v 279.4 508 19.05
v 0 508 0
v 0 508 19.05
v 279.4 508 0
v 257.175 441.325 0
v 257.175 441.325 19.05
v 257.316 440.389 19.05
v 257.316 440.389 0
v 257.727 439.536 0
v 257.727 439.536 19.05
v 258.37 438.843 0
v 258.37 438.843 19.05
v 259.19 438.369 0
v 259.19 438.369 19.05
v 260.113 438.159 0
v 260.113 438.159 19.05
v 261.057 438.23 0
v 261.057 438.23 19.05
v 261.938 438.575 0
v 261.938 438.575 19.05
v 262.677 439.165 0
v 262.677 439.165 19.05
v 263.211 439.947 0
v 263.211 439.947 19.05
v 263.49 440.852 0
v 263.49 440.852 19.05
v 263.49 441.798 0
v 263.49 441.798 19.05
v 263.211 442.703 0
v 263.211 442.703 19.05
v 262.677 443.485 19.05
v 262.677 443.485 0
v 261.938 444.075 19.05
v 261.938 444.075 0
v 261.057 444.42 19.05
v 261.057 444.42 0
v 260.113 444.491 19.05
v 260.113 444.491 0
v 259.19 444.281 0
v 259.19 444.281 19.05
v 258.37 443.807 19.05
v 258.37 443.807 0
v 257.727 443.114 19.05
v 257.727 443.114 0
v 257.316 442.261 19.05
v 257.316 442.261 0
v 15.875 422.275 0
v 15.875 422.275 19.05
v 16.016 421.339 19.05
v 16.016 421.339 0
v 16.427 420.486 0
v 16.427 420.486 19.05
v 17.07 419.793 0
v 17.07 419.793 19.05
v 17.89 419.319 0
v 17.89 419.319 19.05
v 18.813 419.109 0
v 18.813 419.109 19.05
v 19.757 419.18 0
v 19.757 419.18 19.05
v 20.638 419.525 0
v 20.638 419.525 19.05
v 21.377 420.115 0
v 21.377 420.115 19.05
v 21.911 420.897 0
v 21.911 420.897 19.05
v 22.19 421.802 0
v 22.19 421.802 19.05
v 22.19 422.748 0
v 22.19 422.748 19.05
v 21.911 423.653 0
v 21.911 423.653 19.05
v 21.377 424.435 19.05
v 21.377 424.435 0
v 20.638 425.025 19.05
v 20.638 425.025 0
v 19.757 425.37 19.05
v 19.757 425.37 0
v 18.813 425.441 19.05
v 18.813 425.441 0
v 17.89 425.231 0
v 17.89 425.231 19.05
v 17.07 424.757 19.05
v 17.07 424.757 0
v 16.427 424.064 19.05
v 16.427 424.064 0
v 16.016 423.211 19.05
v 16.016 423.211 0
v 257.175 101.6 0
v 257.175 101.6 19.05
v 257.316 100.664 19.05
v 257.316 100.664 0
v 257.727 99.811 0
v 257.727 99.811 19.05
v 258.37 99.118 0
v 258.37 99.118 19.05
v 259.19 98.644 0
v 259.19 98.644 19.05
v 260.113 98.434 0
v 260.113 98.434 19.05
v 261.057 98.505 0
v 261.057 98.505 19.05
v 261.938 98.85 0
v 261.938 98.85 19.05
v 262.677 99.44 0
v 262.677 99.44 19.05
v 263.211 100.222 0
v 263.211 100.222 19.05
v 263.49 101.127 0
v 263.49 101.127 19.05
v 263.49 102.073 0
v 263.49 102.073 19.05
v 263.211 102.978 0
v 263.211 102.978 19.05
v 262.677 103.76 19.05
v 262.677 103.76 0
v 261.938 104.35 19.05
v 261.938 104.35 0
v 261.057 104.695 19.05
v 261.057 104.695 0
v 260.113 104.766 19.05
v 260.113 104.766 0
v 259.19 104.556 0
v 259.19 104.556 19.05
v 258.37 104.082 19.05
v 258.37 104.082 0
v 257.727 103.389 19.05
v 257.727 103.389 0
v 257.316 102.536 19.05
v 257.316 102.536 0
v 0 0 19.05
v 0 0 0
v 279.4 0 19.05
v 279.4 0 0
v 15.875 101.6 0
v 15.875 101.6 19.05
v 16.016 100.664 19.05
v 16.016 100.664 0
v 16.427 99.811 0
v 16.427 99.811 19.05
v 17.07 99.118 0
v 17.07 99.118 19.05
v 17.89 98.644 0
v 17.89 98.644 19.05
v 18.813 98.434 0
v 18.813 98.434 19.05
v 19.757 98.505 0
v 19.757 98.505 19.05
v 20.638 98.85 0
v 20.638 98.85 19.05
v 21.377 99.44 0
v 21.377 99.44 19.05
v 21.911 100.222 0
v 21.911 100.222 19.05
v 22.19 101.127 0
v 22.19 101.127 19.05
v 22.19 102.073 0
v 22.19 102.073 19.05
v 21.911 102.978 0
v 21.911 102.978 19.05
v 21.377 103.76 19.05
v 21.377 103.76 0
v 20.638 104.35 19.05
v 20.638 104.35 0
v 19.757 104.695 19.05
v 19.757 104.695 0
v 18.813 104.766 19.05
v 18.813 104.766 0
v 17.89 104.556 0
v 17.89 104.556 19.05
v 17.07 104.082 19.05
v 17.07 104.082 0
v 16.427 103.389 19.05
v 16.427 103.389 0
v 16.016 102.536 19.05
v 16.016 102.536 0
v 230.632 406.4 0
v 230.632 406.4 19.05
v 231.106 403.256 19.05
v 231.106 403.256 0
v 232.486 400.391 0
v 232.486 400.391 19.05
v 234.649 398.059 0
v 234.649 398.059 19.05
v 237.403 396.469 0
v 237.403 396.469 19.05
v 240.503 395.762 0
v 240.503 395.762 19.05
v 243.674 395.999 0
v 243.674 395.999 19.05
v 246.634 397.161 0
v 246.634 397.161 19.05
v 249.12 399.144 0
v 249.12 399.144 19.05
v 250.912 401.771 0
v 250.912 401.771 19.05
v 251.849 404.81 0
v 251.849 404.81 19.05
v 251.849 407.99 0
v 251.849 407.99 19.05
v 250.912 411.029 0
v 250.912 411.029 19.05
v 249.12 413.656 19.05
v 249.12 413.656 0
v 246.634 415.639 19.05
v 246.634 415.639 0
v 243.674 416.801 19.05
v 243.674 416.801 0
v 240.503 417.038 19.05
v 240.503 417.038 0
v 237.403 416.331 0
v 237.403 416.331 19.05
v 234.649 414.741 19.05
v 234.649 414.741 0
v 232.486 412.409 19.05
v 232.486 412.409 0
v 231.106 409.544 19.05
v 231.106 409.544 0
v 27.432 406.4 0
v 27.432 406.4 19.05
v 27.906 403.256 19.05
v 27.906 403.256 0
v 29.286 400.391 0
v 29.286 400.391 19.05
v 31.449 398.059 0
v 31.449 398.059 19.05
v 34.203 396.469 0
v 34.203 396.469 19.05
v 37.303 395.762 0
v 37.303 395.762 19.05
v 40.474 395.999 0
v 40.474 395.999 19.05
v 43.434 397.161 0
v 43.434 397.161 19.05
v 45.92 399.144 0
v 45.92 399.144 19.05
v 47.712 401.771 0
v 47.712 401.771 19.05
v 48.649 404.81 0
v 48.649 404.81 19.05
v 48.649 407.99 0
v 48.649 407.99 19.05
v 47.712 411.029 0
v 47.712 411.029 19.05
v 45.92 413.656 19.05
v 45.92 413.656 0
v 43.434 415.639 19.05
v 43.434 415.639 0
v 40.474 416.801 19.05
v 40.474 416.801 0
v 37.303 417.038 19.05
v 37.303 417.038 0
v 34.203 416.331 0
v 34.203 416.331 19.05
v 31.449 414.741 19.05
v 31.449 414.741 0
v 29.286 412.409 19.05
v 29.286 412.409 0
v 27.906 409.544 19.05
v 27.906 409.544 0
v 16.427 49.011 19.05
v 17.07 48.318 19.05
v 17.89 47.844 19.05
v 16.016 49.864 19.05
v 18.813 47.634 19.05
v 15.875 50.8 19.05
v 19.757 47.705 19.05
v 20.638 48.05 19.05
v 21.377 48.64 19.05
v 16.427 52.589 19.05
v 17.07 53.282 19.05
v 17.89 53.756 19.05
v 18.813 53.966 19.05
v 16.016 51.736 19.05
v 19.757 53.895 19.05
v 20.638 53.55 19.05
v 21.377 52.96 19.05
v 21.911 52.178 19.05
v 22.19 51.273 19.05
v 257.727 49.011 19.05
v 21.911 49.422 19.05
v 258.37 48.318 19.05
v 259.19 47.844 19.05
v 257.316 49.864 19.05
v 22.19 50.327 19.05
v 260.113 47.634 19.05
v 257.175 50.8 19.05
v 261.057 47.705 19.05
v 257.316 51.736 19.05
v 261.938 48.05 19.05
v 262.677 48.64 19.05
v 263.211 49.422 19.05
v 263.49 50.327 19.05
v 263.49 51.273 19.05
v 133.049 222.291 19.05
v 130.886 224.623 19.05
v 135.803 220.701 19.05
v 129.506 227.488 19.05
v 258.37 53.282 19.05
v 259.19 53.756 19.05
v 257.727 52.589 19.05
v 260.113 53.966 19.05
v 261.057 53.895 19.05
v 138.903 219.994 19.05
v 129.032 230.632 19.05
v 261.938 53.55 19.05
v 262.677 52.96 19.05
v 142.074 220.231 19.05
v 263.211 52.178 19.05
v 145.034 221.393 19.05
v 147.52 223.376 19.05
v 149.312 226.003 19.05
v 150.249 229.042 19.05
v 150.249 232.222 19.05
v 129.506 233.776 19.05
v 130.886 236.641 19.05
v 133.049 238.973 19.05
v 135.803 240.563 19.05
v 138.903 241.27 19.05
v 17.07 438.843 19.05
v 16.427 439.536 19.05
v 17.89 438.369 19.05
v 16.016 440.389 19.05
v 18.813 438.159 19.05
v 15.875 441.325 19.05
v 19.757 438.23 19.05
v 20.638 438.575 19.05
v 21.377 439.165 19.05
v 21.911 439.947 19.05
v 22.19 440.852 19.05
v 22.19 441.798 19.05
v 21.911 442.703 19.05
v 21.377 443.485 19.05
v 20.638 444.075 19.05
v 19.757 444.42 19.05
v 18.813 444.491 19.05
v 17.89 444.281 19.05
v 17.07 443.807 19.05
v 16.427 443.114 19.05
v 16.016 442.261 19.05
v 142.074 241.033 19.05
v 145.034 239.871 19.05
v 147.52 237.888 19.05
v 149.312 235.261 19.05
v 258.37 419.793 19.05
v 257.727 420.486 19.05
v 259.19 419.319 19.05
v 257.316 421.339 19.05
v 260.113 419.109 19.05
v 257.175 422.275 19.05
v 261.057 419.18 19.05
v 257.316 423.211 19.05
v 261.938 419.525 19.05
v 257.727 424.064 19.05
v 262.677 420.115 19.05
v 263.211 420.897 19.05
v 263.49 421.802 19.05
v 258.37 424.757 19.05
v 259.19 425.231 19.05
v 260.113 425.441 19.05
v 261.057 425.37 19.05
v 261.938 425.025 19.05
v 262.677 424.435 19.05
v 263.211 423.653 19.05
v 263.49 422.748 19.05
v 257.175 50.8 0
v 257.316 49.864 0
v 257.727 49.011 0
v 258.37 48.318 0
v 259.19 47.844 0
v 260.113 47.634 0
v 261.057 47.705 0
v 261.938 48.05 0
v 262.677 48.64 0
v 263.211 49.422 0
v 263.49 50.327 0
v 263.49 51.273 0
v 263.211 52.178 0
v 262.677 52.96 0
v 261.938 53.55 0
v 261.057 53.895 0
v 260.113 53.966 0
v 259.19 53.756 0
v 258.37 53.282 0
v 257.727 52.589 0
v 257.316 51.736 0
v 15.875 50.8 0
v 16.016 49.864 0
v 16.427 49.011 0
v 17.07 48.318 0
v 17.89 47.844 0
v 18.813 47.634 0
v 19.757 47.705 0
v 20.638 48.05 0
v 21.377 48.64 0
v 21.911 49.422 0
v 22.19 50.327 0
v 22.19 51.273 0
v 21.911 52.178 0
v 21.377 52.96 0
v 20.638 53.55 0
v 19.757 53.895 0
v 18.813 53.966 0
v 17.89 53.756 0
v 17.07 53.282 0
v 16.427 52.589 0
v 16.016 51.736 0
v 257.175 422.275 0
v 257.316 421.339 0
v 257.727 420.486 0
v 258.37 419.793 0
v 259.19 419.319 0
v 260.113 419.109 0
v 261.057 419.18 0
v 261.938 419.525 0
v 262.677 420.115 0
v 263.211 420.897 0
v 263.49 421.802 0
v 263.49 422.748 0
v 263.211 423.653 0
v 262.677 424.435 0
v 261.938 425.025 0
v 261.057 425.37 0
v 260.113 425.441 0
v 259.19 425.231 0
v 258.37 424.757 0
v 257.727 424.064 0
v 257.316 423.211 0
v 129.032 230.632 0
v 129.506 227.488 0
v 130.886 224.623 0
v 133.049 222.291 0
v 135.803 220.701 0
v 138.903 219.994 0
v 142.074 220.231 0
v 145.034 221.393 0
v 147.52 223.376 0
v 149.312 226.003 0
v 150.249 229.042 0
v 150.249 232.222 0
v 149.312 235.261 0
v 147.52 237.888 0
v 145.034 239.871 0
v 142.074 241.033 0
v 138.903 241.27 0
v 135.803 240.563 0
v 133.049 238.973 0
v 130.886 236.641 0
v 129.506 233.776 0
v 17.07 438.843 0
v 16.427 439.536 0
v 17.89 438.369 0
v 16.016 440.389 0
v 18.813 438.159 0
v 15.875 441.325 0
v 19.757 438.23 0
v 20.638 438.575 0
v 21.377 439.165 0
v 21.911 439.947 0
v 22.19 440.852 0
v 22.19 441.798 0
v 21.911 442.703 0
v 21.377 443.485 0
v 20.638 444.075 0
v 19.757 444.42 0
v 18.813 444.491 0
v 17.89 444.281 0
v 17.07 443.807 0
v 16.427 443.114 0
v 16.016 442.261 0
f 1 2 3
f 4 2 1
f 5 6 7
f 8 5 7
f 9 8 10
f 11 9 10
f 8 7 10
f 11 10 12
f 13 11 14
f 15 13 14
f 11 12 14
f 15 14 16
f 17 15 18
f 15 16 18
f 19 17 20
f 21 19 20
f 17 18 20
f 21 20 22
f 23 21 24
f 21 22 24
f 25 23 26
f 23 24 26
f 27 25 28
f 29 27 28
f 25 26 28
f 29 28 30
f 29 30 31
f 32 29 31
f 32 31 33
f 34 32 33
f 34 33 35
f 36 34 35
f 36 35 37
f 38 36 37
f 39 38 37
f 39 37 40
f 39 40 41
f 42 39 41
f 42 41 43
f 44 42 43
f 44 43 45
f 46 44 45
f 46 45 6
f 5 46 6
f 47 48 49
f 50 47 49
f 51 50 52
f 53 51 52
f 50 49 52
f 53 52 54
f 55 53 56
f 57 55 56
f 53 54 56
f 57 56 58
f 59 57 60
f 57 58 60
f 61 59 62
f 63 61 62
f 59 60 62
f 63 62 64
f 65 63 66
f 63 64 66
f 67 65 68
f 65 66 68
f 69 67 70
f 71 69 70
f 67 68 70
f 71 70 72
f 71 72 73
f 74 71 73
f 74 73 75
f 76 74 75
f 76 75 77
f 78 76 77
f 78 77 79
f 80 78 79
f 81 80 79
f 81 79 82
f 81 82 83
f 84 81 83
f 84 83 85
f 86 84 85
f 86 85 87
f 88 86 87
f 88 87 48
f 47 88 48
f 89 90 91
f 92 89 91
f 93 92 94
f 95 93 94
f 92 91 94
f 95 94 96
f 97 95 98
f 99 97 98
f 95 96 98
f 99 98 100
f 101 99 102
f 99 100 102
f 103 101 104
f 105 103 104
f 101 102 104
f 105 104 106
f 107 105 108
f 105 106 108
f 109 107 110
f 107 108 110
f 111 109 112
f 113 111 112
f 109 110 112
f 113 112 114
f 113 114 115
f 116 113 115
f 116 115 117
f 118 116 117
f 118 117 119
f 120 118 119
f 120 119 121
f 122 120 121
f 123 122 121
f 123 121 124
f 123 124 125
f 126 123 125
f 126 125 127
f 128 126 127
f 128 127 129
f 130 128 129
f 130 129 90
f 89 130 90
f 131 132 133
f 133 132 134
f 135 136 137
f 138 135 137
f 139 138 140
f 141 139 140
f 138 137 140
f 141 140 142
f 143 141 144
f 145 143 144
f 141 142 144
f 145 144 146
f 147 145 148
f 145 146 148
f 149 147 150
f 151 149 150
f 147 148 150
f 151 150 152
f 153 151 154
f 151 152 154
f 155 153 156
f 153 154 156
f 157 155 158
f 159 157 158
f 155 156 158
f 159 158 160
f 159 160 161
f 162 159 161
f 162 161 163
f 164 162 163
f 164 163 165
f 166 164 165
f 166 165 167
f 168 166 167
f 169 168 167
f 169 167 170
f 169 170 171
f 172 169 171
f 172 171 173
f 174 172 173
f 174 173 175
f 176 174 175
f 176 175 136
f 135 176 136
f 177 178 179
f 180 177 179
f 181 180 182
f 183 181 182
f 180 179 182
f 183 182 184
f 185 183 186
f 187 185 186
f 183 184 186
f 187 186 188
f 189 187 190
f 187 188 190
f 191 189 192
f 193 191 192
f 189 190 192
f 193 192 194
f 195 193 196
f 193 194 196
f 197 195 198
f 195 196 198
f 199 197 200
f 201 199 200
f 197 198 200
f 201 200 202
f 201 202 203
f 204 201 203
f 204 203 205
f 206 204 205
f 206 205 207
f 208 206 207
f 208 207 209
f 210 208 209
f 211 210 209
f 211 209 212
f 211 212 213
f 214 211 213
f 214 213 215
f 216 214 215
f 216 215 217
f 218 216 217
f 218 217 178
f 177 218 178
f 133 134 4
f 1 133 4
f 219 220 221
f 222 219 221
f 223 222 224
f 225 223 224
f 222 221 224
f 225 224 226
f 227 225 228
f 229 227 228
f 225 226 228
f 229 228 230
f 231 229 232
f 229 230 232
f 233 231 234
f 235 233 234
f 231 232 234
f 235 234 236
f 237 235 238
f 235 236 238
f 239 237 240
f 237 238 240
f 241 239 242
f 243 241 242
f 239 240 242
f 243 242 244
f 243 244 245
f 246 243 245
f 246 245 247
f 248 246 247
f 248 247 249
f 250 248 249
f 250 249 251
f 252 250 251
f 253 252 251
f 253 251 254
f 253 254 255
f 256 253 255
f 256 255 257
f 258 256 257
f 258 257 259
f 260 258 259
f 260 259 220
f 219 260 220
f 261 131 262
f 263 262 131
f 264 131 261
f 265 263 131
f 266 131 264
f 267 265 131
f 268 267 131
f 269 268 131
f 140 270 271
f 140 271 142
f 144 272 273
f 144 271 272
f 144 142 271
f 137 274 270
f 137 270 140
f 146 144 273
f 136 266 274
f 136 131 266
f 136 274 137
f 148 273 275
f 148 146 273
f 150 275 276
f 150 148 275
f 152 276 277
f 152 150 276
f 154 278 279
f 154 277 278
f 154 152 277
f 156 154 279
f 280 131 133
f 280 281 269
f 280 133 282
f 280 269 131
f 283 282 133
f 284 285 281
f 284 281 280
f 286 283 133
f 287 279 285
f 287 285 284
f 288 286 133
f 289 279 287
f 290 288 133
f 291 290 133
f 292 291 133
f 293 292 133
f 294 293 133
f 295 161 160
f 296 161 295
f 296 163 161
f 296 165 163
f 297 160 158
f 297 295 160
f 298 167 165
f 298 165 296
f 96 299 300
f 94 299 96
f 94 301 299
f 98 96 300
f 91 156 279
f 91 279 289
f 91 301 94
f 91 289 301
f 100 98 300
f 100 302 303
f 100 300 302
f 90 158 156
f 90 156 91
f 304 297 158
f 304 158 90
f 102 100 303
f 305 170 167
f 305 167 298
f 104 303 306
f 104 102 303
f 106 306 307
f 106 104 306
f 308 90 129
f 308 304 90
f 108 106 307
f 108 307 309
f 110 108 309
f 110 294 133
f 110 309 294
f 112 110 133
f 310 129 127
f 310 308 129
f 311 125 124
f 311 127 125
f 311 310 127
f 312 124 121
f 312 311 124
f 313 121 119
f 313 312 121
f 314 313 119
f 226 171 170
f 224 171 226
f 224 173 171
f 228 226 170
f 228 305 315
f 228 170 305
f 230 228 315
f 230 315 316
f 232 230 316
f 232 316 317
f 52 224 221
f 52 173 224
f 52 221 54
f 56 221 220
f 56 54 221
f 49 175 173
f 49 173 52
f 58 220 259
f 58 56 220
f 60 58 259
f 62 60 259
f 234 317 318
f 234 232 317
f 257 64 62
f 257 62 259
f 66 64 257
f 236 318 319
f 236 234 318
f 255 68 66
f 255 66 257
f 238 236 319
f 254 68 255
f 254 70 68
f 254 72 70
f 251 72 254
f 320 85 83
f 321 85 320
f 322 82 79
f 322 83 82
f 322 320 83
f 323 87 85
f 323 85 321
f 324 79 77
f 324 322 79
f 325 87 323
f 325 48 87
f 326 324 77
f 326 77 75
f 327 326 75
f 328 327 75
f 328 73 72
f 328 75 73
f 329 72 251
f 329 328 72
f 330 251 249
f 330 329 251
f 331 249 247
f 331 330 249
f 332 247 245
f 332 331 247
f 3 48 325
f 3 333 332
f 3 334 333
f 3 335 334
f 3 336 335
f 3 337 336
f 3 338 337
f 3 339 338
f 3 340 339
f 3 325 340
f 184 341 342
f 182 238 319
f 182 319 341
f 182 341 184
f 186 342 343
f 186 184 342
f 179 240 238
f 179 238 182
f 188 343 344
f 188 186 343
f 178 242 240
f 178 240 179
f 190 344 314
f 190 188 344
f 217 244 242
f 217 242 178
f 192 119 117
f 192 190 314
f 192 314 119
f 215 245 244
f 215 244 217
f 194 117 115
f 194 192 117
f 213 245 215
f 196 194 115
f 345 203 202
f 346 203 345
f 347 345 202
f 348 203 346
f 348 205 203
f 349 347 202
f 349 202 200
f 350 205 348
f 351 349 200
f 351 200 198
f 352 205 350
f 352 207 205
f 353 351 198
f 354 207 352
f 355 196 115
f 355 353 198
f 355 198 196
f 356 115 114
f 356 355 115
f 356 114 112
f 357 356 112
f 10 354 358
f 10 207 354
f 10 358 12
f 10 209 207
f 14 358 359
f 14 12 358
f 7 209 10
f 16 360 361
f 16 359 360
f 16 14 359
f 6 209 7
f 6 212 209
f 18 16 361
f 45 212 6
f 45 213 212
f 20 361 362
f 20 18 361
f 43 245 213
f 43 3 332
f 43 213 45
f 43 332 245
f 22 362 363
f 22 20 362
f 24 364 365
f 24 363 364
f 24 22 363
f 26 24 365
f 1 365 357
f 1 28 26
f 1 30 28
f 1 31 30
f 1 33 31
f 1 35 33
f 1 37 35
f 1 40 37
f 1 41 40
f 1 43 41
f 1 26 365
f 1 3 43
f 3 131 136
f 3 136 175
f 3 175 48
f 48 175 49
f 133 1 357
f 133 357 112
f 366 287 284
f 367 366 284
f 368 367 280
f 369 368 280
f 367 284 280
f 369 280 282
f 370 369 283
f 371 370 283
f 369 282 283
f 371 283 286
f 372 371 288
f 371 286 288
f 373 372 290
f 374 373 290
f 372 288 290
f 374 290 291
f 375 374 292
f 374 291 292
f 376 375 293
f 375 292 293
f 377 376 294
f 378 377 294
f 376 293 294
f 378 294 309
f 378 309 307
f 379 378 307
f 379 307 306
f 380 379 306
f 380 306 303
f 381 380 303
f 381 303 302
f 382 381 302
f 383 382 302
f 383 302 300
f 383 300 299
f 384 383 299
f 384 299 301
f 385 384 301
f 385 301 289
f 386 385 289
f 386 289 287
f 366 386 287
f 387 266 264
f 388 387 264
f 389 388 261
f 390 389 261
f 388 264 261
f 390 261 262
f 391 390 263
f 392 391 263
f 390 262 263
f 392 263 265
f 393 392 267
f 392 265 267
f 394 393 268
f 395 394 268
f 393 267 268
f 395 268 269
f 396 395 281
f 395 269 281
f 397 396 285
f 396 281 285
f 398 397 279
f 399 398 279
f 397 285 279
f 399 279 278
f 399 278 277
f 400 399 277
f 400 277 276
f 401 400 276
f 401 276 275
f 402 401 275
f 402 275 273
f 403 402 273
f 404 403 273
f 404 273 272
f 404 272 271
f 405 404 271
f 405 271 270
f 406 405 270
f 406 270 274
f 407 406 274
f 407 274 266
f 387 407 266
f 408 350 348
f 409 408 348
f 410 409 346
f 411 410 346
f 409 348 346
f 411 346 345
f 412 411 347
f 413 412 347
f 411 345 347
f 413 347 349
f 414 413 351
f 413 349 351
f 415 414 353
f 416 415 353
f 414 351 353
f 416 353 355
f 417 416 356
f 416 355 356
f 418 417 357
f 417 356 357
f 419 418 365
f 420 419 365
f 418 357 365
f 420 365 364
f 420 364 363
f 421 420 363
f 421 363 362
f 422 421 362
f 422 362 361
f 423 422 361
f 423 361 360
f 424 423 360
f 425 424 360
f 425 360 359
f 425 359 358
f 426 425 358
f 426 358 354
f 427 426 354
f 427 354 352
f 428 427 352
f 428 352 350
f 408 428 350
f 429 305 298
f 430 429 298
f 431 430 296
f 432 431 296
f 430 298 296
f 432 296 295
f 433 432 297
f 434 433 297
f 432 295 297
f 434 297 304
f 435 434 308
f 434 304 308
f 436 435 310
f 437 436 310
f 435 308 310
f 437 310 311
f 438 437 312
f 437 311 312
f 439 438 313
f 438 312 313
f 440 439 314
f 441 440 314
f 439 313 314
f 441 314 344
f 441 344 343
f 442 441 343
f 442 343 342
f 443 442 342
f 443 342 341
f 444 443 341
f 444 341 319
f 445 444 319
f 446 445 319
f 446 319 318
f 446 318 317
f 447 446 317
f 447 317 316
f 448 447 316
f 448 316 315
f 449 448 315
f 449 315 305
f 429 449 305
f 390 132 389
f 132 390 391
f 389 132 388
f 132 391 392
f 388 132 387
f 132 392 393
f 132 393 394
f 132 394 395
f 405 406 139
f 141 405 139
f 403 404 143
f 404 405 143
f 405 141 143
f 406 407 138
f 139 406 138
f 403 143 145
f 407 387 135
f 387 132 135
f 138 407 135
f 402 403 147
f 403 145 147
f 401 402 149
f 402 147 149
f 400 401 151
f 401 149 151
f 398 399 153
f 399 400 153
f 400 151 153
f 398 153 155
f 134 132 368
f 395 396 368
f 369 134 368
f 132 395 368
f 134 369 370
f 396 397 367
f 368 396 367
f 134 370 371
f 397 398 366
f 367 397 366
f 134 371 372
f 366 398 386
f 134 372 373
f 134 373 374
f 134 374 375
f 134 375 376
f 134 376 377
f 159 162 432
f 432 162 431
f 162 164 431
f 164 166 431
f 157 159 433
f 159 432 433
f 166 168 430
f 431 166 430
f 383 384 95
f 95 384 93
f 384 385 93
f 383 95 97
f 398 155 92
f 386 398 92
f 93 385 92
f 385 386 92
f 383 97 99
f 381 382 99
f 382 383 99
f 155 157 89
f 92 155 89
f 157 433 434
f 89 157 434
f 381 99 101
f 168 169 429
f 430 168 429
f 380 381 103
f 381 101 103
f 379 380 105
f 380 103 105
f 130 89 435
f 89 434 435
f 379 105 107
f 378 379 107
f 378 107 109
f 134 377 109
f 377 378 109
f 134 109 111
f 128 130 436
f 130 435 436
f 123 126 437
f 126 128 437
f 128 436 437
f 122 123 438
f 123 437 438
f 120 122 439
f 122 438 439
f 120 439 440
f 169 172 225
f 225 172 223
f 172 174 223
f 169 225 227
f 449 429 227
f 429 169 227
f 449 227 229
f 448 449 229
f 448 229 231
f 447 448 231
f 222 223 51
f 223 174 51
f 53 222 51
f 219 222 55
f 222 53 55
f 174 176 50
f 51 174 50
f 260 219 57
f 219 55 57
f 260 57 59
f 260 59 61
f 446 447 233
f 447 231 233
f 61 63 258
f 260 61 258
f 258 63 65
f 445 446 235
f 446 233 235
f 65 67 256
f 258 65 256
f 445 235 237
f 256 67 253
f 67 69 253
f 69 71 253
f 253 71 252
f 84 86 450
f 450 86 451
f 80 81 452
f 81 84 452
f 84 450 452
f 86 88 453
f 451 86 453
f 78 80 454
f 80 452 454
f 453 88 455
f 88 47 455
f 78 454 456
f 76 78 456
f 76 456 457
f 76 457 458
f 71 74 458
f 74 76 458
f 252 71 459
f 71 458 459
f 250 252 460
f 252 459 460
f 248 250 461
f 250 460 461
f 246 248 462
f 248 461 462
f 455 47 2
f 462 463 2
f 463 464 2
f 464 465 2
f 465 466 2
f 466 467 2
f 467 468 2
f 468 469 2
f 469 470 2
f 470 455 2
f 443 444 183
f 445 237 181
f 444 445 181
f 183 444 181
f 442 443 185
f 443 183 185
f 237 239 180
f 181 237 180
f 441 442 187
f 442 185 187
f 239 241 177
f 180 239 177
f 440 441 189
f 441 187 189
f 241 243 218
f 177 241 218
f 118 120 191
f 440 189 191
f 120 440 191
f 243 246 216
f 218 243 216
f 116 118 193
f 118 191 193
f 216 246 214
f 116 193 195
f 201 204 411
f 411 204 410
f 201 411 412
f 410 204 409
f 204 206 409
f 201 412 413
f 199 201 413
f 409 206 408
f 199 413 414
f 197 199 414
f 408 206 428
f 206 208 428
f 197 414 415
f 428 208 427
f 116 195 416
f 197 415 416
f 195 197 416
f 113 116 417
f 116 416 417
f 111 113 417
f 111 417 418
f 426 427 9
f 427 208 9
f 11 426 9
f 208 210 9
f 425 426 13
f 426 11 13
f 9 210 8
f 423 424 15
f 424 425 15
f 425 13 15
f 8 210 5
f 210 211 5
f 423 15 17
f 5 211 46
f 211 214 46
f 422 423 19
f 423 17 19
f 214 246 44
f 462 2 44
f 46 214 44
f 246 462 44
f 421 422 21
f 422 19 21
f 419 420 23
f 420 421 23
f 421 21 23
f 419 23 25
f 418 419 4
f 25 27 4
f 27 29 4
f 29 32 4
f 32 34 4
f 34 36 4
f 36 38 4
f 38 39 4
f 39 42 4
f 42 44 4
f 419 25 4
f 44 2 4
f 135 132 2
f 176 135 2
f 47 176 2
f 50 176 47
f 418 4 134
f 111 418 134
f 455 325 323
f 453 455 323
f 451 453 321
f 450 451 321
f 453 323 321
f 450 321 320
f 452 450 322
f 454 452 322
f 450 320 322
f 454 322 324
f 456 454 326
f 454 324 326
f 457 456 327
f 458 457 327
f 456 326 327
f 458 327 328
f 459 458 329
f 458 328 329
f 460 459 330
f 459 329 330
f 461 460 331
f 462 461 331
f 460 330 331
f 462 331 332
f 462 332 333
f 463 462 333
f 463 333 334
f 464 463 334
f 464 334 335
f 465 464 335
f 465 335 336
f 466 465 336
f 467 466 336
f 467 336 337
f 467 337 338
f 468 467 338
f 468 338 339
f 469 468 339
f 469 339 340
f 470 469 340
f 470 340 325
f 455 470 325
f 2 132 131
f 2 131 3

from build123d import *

# Parameters (mm, degrees)
F0_W     = 279.4
F0_H     = 508
F1_DEPTH = 19.05
F2_D     = 6.35
F3_D     = 6.35
F4_D     = 21.336


with BuildPart() as f1:
    # F0 (on Top) → F1 (new body)
    with BuildSketch(Plane.XY):
        with Locations((139.7, 254)):
            Rectangle(F0_W, F0_H)
    extrude(amount=F1_DEPTH)

    # F2 (through all)
    with Locations(Plane(origin=(0, 0, 0), x_dir=(1, 0, 0), z_dir=(0, 0, -1))):
        with Locations((19.05, -101.6), (260.35, -101.6), (260.35, -50.8), (19.05, -50.8)):
            Hole(F2_D / 2)

    # F3 (through all)
    with Locations(Plane(origin=(0, 0, 0), x_dir=(1, 0, 0), z_dir=(0, 0, -1))):
        with Locations((19.05, -441.325), (19.05, -422.275), (260.35, -422.275), (260.35, -441.325)):
            Hole(F3_D / 2)

    # F4 (through all)
    with Locations(Plane(origin=(0, 0, 0), x_dir=(1, 0, 0), z_dir=(0, 0, -1))):
        with Locations((38.1, -406.4), (241.3, -406.4), (139.7, -230.632)):
            Hole(F4_D / 2)


solid = f1.part
